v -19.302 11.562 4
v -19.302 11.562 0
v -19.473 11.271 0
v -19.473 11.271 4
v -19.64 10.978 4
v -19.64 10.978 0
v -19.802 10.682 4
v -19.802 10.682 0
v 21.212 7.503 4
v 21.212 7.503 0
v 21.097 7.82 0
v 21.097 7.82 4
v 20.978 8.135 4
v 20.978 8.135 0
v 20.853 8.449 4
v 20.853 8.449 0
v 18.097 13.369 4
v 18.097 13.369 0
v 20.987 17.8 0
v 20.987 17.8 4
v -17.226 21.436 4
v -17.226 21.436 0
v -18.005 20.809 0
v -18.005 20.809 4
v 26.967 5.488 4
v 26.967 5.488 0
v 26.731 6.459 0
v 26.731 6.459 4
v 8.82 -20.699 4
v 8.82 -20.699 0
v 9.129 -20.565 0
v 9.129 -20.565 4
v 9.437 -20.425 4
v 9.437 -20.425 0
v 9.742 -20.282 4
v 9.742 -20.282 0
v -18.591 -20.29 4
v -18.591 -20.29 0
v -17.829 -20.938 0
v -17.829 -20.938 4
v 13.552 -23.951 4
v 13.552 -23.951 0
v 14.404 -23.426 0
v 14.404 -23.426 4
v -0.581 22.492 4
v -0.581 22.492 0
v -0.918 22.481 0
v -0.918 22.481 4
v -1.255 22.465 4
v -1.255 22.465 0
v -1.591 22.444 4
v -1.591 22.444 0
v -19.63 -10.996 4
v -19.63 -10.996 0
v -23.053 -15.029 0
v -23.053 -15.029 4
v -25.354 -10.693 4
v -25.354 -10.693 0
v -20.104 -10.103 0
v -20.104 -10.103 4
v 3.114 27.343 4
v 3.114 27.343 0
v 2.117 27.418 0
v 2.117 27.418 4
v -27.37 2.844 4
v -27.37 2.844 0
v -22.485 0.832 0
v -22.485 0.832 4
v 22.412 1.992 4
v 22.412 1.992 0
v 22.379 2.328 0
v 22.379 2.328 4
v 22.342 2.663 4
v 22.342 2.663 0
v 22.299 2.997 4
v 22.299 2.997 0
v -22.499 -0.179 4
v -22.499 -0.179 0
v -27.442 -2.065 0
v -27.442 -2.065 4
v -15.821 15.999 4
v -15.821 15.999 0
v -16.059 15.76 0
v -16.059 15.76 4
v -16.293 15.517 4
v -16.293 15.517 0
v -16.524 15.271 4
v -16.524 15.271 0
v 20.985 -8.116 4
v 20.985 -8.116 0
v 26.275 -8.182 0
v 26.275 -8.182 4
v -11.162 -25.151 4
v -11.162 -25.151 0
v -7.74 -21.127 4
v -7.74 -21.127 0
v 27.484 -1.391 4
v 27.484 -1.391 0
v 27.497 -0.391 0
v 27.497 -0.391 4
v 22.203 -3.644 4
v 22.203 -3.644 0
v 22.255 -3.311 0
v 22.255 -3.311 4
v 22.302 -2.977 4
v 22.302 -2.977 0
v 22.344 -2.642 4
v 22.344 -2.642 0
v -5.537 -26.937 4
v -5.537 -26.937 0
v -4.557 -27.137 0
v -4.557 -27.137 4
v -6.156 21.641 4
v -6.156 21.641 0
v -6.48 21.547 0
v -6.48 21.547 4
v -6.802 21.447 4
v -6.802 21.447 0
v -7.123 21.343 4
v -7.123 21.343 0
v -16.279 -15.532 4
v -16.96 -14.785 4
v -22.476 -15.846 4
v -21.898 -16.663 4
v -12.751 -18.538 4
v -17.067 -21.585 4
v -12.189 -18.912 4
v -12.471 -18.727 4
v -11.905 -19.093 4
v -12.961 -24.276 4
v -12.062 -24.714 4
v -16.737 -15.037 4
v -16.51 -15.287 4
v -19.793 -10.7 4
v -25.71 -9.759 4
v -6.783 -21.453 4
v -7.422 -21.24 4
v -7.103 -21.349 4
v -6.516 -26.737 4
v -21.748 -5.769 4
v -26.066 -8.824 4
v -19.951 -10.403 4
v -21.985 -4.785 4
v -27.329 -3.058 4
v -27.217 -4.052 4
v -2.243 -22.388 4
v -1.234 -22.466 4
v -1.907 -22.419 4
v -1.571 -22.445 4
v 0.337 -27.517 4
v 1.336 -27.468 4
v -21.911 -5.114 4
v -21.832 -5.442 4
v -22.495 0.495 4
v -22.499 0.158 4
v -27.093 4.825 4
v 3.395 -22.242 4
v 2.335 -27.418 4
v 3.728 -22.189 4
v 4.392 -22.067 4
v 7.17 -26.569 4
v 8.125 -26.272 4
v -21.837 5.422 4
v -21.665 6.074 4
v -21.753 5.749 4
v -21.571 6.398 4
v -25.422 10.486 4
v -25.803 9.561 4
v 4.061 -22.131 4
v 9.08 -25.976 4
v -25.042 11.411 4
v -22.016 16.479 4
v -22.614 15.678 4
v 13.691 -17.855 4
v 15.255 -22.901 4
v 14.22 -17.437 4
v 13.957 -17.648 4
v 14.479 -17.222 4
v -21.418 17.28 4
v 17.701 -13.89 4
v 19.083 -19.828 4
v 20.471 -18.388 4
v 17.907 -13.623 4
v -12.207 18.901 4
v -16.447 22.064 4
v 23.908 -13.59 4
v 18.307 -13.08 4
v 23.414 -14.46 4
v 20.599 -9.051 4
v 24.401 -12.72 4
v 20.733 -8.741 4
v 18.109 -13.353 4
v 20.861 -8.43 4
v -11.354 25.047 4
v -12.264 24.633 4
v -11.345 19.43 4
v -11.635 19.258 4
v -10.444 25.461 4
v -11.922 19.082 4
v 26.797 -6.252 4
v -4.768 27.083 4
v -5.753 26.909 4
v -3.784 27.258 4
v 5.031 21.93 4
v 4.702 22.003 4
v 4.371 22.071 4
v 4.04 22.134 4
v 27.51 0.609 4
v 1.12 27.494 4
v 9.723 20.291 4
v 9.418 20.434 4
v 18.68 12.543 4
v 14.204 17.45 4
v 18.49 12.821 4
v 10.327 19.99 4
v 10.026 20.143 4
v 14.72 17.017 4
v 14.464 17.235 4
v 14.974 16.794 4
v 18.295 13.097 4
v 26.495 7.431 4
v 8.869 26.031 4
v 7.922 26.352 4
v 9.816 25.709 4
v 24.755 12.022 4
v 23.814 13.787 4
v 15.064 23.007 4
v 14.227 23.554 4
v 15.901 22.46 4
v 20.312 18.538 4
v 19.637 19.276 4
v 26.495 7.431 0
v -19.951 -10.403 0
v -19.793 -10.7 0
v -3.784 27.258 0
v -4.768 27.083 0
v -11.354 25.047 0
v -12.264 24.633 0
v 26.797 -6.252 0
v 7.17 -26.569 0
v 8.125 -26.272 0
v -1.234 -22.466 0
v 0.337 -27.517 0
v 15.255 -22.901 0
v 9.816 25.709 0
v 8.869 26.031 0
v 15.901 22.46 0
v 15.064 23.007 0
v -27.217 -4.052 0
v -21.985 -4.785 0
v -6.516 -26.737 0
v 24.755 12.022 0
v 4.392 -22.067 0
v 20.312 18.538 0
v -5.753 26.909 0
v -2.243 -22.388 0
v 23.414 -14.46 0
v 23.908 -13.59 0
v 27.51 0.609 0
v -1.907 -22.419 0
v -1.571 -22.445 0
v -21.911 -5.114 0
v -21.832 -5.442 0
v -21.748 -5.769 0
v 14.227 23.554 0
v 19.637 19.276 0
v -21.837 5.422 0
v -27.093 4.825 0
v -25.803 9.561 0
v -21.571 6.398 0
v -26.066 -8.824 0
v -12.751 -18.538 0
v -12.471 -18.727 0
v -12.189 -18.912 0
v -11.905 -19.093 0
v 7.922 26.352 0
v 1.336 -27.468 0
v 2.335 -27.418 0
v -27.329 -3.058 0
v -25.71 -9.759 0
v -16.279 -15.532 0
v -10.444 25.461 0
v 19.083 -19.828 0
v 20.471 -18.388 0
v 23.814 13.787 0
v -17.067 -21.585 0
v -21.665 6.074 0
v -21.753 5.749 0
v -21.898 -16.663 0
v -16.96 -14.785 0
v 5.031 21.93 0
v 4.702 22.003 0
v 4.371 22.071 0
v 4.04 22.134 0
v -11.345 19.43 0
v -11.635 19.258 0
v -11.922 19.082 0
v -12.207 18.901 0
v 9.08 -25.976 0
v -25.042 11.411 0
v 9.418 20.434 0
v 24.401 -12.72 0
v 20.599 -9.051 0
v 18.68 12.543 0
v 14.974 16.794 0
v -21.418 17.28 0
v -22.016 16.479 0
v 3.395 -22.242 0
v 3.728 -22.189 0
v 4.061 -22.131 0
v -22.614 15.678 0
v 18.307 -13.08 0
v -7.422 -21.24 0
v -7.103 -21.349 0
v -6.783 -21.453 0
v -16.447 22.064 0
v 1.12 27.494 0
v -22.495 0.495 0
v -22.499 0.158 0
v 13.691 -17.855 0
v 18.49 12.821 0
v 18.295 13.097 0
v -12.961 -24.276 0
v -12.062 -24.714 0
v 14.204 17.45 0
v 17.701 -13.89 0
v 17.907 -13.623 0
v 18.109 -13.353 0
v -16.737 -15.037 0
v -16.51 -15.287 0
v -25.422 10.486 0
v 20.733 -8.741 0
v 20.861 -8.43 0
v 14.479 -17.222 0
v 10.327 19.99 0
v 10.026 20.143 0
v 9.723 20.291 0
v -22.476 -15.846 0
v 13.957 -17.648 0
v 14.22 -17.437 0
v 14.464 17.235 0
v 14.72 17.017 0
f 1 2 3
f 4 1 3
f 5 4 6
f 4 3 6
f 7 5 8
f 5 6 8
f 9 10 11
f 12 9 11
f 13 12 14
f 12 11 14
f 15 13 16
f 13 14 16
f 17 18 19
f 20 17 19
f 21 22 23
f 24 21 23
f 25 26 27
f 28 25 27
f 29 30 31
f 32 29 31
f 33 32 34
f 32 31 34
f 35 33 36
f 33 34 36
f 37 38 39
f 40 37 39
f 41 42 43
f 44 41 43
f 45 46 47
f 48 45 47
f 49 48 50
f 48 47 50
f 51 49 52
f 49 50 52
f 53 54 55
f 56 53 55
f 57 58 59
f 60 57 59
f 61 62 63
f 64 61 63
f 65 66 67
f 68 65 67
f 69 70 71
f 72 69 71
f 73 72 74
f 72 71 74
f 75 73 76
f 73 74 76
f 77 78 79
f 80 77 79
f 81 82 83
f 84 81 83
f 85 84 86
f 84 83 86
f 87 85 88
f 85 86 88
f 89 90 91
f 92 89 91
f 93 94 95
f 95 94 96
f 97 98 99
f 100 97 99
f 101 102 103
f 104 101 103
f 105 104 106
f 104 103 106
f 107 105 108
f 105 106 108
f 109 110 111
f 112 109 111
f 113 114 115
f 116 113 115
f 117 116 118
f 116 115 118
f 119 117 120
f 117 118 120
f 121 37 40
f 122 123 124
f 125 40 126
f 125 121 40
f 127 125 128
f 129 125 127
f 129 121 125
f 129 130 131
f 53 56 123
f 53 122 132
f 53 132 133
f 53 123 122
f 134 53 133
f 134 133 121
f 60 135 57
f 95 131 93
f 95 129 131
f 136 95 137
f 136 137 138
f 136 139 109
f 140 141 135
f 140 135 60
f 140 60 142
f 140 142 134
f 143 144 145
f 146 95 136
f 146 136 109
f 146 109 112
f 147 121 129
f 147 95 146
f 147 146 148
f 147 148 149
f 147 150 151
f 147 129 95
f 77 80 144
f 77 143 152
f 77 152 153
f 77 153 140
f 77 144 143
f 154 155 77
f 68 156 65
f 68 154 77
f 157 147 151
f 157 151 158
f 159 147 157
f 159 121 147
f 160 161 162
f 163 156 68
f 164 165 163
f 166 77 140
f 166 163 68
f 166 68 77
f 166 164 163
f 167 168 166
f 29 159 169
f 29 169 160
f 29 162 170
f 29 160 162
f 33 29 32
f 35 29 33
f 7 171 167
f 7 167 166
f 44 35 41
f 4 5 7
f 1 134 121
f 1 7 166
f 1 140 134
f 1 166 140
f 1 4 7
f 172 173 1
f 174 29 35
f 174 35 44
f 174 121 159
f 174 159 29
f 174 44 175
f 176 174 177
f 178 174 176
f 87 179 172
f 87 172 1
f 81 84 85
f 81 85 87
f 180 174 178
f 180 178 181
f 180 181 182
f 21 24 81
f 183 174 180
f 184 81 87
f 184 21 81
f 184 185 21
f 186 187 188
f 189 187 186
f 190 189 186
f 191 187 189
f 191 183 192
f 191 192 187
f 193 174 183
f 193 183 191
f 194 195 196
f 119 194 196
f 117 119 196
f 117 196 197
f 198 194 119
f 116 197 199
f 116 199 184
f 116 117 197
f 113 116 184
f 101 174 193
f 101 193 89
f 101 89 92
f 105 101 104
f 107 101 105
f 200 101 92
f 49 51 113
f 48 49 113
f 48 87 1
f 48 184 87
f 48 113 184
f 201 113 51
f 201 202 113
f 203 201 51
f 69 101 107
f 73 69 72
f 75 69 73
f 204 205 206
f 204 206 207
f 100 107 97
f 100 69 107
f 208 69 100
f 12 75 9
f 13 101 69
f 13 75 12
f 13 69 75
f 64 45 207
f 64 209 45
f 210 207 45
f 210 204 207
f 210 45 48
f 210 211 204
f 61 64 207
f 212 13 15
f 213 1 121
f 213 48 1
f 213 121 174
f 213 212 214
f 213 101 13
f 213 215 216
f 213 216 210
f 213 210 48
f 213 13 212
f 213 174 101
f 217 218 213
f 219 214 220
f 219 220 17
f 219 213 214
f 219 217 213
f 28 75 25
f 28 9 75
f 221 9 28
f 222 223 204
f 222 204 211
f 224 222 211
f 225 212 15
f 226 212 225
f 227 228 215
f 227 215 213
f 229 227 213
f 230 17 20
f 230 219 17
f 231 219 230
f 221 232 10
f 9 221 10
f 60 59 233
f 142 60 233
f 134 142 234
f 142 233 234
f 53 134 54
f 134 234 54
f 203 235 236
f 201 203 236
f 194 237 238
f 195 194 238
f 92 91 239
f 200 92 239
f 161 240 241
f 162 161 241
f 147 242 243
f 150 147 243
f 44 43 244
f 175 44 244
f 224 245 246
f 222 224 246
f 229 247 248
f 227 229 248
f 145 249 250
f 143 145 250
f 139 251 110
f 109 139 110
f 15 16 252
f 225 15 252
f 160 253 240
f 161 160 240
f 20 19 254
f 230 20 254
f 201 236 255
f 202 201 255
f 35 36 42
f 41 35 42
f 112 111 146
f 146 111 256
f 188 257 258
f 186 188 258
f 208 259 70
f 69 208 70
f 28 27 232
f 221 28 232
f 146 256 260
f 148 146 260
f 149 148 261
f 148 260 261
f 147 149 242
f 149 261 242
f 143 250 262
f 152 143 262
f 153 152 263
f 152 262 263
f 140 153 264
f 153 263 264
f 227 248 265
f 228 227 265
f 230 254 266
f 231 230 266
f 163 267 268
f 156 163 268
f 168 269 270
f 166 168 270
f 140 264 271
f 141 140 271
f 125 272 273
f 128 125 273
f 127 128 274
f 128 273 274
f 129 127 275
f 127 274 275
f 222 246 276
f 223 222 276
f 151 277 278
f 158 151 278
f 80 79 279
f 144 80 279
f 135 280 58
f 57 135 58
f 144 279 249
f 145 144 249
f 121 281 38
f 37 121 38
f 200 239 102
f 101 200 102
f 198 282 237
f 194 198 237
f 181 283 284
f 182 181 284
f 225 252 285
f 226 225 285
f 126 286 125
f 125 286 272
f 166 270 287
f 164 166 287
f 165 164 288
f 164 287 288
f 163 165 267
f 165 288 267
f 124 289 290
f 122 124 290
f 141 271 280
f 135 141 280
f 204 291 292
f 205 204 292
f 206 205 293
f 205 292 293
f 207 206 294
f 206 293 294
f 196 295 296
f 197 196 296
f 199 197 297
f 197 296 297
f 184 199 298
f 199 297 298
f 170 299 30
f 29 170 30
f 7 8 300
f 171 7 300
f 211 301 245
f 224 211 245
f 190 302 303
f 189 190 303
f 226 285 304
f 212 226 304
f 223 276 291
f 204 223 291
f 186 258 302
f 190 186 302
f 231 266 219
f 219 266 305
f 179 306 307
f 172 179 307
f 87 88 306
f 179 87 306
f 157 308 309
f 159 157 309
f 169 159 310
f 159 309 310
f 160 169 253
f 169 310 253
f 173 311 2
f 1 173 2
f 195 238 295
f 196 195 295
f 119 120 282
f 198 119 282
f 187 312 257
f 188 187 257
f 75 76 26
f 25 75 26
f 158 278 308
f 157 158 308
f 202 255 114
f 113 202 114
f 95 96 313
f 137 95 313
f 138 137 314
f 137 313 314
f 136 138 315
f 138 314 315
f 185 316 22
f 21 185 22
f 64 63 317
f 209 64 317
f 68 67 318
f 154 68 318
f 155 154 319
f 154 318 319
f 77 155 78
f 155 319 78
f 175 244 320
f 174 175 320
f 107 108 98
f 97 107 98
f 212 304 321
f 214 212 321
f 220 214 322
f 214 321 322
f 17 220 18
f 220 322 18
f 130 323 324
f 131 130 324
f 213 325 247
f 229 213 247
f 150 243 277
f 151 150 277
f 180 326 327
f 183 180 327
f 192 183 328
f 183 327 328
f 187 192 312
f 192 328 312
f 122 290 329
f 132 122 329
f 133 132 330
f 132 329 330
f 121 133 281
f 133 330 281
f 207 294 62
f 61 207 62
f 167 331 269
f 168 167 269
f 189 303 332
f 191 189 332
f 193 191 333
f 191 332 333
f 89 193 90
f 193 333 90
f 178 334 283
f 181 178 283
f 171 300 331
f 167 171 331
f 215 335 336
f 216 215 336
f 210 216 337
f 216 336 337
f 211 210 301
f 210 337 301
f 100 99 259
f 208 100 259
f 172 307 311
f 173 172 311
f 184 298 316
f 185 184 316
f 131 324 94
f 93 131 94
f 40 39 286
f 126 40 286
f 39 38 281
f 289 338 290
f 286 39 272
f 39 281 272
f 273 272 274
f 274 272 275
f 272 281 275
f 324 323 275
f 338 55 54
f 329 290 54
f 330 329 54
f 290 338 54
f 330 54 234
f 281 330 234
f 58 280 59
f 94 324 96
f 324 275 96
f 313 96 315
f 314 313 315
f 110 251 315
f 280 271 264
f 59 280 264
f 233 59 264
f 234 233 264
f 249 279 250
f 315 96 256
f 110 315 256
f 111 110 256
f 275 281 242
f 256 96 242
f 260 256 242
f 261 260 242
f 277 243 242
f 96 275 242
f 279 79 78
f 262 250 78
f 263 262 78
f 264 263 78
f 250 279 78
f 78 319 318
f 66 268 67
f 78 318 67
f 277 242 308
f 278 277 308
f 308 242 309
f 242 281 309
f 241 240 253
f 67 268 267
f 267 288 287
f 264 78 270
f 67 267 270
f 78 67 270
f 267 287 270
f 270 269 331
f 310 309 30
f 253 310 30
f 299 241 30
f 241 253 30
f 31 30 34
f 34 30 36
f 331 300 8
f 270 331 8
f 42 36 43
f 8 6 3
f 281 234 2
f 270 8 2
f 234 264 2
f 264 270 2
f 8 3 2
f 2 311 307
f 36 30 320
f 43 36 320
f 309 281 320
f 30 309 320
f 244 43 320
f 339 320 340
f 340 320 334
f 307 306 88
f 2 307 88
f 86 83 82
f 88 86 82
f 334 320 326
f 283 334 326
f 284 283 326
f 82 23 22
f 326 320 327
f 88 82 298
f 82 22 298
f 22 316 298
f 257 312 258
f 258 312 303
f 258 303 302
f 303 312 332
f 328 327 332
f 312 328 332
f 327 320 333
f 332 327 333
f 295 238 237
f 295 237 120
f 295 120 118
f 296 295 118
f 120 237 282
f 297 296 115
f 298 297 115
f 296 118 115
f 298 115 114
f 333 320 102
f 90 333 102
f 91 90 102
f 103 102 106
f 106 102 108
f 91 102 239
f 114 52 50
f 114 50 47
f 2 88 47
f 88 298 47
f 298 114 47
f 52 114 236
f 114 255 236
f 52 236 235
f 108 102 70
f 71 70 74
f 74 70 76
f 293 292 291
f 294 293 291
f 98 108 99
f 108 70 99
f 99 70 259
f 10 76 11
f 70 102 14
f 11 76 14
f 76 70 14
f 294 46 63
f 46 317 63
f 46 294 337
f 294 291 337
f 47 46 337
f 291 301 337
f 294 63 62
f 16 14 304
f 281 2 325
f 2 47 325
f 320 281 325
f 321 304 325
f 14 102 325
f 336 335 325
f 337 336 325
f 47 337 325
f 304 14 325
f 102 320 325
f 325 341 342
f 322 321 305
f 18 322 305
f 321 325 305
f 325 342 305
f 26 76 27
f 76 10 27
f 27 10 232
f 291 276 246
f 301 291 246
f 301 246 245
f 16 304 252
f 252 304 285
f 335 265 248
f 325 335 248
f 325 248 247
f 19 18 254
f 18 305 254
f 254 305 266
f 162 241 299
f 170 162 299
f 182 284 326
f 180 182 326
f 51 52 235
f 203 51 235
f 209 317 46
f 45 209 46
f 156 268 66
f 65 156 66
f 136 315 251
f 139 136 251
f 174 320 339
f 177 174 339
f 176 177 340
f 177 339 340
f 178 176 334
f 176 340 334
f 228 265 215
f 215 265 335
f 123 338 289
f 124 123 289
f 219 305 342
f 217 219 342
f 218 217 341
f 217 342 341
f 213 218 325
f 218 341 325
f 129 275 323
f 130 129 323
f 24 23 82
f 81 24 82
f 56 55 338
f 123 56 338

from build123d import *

# Parameters (mm, degrees)
F1_DEPTH = 4


# Not quite as in the source:
# - a feature names something its author has since deleted; it is built from what else it names


with BuildPart() as f1:
    # F0 (on Top) → F1 (new body)
    with BuildSketch(Plane.XY):
        with BuildLine():
            ThreePointArc((-15.8207142224, 15.9985937349), (-16.1763177404, 15.6389495927), (-16.5237476958, 15.2714034091))
            ThreePointArc((-16.5237476958, 15.2714034091), (-17.2896362976, 14.3985581465), (-18.0094723367, 13.4873609781))
            ThreePointArc((-18.0094723367, 13.4873609781), (-18.6807530995, 12.5411109411), (-19.3023658635, 11.5615168585))
            ThreePointArc((-19.3023658635, 11.5615168585), (-19.557357582, 11.1247365996), (-19.8024673676, 10.6823352389))
            ThreePointArc((-19.8024673676, 10.6823352389), (-20.7974411865, 8.585827863), (-21.5711788684, 6.3979873576))
            ThreePointArc((-21.5711788684, 6.3979873576), (-21.7095367198, 5.9115154921), (-21.8369251863, 5.4220566587))
            ThreePointArc((-21.8369251863, 5.4220566587), (-22.2792598903, 3.1439749905), (-22.4845953717, 0.8324487809))
            ThreePointArc((-22.4845953717, 0.8324487809), (-22.4976258234, 0.3268521252), (-22.4992886849, -0.1789096823))
            ThreePointArc((-22.4992886849, -0.1789096823), (-22.3611907578, -2.4954253934), (-21.9852220552, -4.7853956142))
            ThreePointArc((-21.9852220552, -4.7853956142), (-21.872106356, -5.2783485629), (-21.7479391288, -5.76863447))
            ThreePointArc((-21.7479391288, -5.76863447), (-21.0380857712, -7.9780290224), (-20.104436381, -10.1025560035))
            ThreePointArc((-20.104436381, -10.1025560035), (-19.8722820063, -10.5518911983), (-19.630086574, -10.9958947383))
            ThreePointArc((-19.630086574, -10.9958947383), (-18.393080483, -12.9593437467), (-16.96041503, -14.7849356444))
            ThreePointArc((-16.96041503, -14.7849356444), (-16.623809093, -15.1624197026), (-16.2788034853, -15.5322425002))
            ThreePointArc((-16.2788034853, -15.5322425002), (-14.5923703031, -17.1263752422), (-12.7507084267, -18.5383234036))
            ThreePointArc((-12.7507084267, -18.5383234036), (-12.3308011164, -18.8202376135), (-11.9046633044, -19.0926423422))
            ThreePointArc((-11.9046633044, -19.0926423422), (-9.87476783, -20.2172935949), (-7.7398279191, -21.1268801242))
            ThreePointArc((-7.7398279191, -21.1268801242), (-7.263003556, -21.2955107792), (-6.7825093458, -21.4533812481))
            ThreePointArc((-6.7825093458, -21.4533812481), (-4.5366973773, -22.0378850371), (-2.2426255582, -22.3879572674))
            ThreePointArc((-2.2426255582, -22.3879572674), (-1.7388447708, -22.4327086832), (-1.2341853806, -22.46612531))
            ThreePointArc((-1.2341853806, -22.46612531), (1.0864304565, -22.4737551126), (3.3954892143, -22.2423167183))
            ThreePointArc((3.3954892143, -22.2423167183), (3.8945720264, -22.1603769988), (4.391686991, -22.0672400942))
            ThreePointArc((4.391686991, -22.0672400942), (6.641293869, -21.4975165018), (8.8202529117, -20.6991096082))
            ThreePointArc((8.8202529117, -20.6991096082), (9.28327854, -20.4956273275), (9.7416135175, -20.2817890255))
            ThreePointArc((9.7416135175, -20.2817890255), (11.7788603628, -19.1705098668), (13.69080768, -17.8553013155))
            ThreePointArc((13.69080768, -17.8553013155), (14.0886825213, -17.5430620136), (14.4794386395, -17.2219585612))
            ThreePointArc((14.4794386395, -17.2219585612), (16.1763177404, -15.6389495927), (17.7011186506, -13.8895787739))
            ThreePointArc((17.7011186506, -13.8895787739), (18.0088427653, -13.4882015945), (18.3074673802, -13.0800091026))
            ThreePointArc((18.3074673802, -13.0800091026), (19.557357582, -11.1247365996), (20.5992032362, -9.0511229157))
            ThreePointArc((20.5992032362, -9.0511229157), (20.7974411865, -8.585827863), (20.9851706152, -8.1161945671))
            ThreePointArc((20.9851706152, -8.1161945671), (21.7095367198, -5.9115154921), (22.2029641238, -3.643951717))
            ThreePointArc((22.2029641238, -3.643951717), (22.2792598903, -3.1439749905), (22.3442984024, -2.6424096777))
            ThreePointArc((22.3442984024, -2.6424096777), (22.4610408714, -1.3234964953), (22.5, 0))
            ThreePointArc((22.5, 0), (22.4778969231, 0.9970706661), (22.4116311188, 1.9921823697))
            ThreePointArc((22.4116311188, 1.9921823697), (22.3611907578, 2.4954253934), (22.2994517444, 2.9974075298))
            ThreePointArc((22.2994517444, 2.9974075298), (21.872106356, 5.2783485629), (21.2120929064, 7.5031403113))
            ThreePointArc((21.2120929064, 7.5031403113), (21.0380857712, 7.9780290224), (20.8534485216, 8.4488865986))
            ThreePointArc((20.8534485216, 8.4488865986), (19.8722820063, 10.5518911983), (18.679720884, 12.5426483525))
            ThreePointArc((18.679720884, 12.5426483525), (18.393080483, 12.9593437467), (18.0971464347, 13.3694910495))
            ThreePointArc((18.0971464347, 13.3694910495), (16.623809093, 15.1624197026), (14.9736332993, 16.7940556691))
            ThreePointArc((14.9736332993, 16.7940556691), (14.5923703031, 17.1263752422), (14.2037340805, 17.4500412082))
            ThreePointArc((14.2037340805, 17.4500412082), (12.3308011164, 18.8202376135), (10.3266972653, 19.9902307038))
            ThreePointArc((10.3266972653, 19.9902307038), (9.87476783, 20.2172935949), (9.4178488765, 20.4341411011))
            ThreePointArc((9.4178488765, 20.4341411011), (7.263003556, 21.2955107792), (5.0308968631, 21.9303460245))
            ThreePointArc((5.0308968631, 21.9303460245), (4.5366973773, 22.0378850371), (4.0402055911, 22.1342887571))
            ThreePointArc((4.0402055911, 22.1342887571), (1.7388447708, 22.4327086832), (-0.5810132914, 22.4924970502))
            ThreePointArc((-0.5810132914, 22.4924970502), (-1.0864304565, 22.4737551126), (-1.5912986705, 22.4436576462))
            ThreePointArc((-1.5912986705, 22.4436576462), (-3.8945720264, 22.1603769988), (-6.1564162439, 21.6413617647))
            ThreePointArc((-6.1564162439, 21.6413617647), (-6.641293869, 21.4975165018), (-7.1228157842, 21.3428089835))
            ThreePointArc((-7.1228157842, 21.3428089835), (-9.28327854, 20.4956273275), (-11.3449889221, 19.4304201282))
            ThreePointArc((-11.3449889221, 19.4304201282), (-11.7788603628, 19.1705098668), (-12.2067801862, 18.9009131389))
            ThreePointArc((-12.2067801862, 18.9009131389), (-14.0886825213, 17.5430620136), (-15.8207142224, 15.9985937349))
        make_face()
        with BuildLine():
            ThreePointArc((-18.0094723367, 13.4873609781), (-17.2896362976, 14.3985581465), (-16.5237476958, 15.2714034091))
            Line((-16.5237476958, 15.2714034091), (-21.4175280286, 17.2801378501))
            Line((-21.4175280286, 17.2801378501), (-22.0158291312, 16.4788664912))
            Line((-22.0158291312, 16.4788664912), (-18.0094723367, 13.4873609781))
        make_face()
        with BuildLine():
            ThreePointArc((-19.3023658635, 11.5615168585), (-18.6807530995, 12.5411109411), (-18.0094723367, 13.4873609781))
            Line((-18.0094723367, 13.4873609781), (-22.0158291312, 16.4788664912))
            Line((-22.0158291312, 16.4788664912), (-22.6141302339, 15.6775951323))
            Line((-22.6141302339, 15.6775951323), (-19.3023658635, 11.5615168585))
        make_face()
        with BuildLine():
            Line((-18.0048063836, 20.8089601483), (-15.8207142224, 15.9985937349))
            ThreePointArc((-15.8207142224, 15.9985937349), (-14.0886825213, 17.5430620136), (-12.2067801862, 18.9009131389))
            Line((-12.2067801862, 18.9009131389), (-16.4472614694, 22.0635731724))
            Line((-16.4472614694, 22.0635731724), (-17.2260339265, 21.4362666603))
            Line((-17.2260339265, 21.4362666603), (-18.0048063836, 20.8089601483))
        make_face()
        with BuildLine():
            ThreePointArc((-21.5711788684, 6.3979873576), (-20.7974411865, 8.585827863), (-19.8024673676, 10.6823352389))
            Line((-19.8024673676, 10.6823352389), (-25.0420525337, 11.4109279148))
            Line((-25.0420525337, 11.4109279148), (-25.4222888231, 10.4860385354))
            Line((-25.4222888231, 10.4860385354), (-25.8025251126, 9.5611491559))
            Line((-25.8025251126, 9.5611491559), (-21.5711788684, 6.3979873576))
        make_face()
        with BuildLine():
            Line((-12.2641743313, 24.6328216682), (-11.3449889221, 19.4304201282))
            ThreePointArc((-11.3449889221, 19.4304201282), (-9.28327854, 20.4956273275), (-7.1228157842, 21.3428089835))
            Line((-7.1228157842, 21.3428089835), (-10.4435529833, 25.4606730481))
            Line((-10.4435529833, 25.4606730481), (-11.3538636573, 25.0467473581))
            Line((-11.3538636573, 25.0467473581), (-12.2641743313, 24.6328216682))
        make_face()
        with BuildLine():
            ThreePointArc((-22.4845953717, 0.8324487809), (-22.2792598903, 3.1439749905), (-21.8369251863, 5.4220566587))
            Line((-21.8369251863, 5.4220566587), (-27.0930927798, 4.8247274121))
            Line((-27.0930927798, 4.8247274121), (-27.2313726116, 3.8343342134))
            Line((-27.2313726116, 3.8343342134), (-27.3696524434, 2.8439410147))
            Line((-27.3696524434, 2.8439410147), (-22.4845953717, 0.8324487809))
        make_face()
        with BuildLine():
            Line((-5.7529391012, 26.9089124095), (-6.1564162439, 21.6413617647))
            ThreePointArc((-6.1564162439, 21.6413617647), (-3.8945720264, 22.1603769988), (-1.5912986705, 22.4436576462))
            Line((-1.5912986705, 22.4436576462), (-3.7836376545, 27.2579851984))
            Line((-3.7836376545, 27.2579851984), (-4.7682883778, 27.083448804))
            Line((-4.7682883778, 27.083448804), (-5.7529391012, 26.9089124095))
        make_face()
        with BuildLine():
            ThreePointArc((-21.9852220552, -4.7853956142), (-22.3611907578, -2.4954253934), (-22.4992886849, -0.1789096823))
            Line((-22.4992886849, -0.1789096823), (-27.4417743651, -2.0646284579))
            Line((-27.4417743651, -2.0646284579), (-27.3294091089, -3.0582954289))
            Line((-27.3294091089, -3.0582954289), (-27.2170438526, -4.0519623998))
            Line((-27.2170438526, -4.0519623998), (-21.9852220552, -4.7853956142))
        make_face()
        with BuildLine():
            Line((1.1197744504, 27.4942172201), (-0.5810132914, 22.4924970502))
            ThreePointArc((-0.5810132914, 22.4924970502), (1.7388447708, 22.4327086832), (4.0402055911, 22.1342887571))
            Line((4.0402055911, 22.1342887571), (3.1140175434, 27.3425778908))
            Line((3.1140175434, 27.3425778908), (2.1168959969, 27.4183975554))
            Line((2.1168959969, 27.4183975554), (1.1197744504, 27.4942172201))
        make_face()
        with BuildLine():
            ThreePointArc((-20.104436381, -10.1025560035), (-21.0380857712, -7.9780290224), (-21.7479391288, -5.76863447))
            Line((-21.7479391288, -5.76863447), (-26.0661883433, -8.8242561288))
            Line((-26.0661883433, -8.8242561288), (-25.7102383213, -9.7587611217))
            Line((-25.7102383213, -9.7587611217), (-25.3542882993, -10.6932661147))
            Line((-25.3542882993, -10.6932661147), (-20.104436381, -10.1025560035))
        make_face()
        with BuildLine():
            Line((7.9221284551, 26.3519592461), (5.0308968631, 21.9303460245))
            ThreePointArc((5.0308968631, 21.9303460245), (7.263003556, 21.2955107792), (9.4178488765, 20.4341411011))
            Line((9.4178488765, 20.4341411011), (9.8160075665, 25.7091358554))
            Line((9.8160075665, 25.7091358554), (8.8690680108, 26.0305475507))
            Line((8.8690680108, 26.0305475507), (7.9221284551, 26.3519592461))
        make_face()
        with BuildLine():
            ThreePointArc((-16.96041503, -14.7849356444), (-18.393080483, -12.9593437467), (-19.630086574, -10.9958947383))
            Line((-19.630086574, -10.9958947383), (-23.0527678432, -15.0294233337))
            Line((-23.0527678432, -15.0294233337), (-22.4755987044, -15.8460479631))
            Line((-22.4755987044, -15.8460479631), (-21.8984295657, -16.6626725925))
            Line((-21.8984295657, -16.6626725925), (-16.96041503, -14.7849356444))
        make_face()
        with BuildLine():
            Line((14.2267059934, 23.5539107569), (10.3266972653, 19.9902307038))
            ThreePointArc((10.3266972653, 19.9902307038), (12.3308011164, 18.8202376135), (14.2037340805, 17.4500412082))
            Line((14.2037340805, 17.4500412082), (15.9012217334, 22.4602942626))
            Line((15.9012217334, 22.4602942626), (15.0639638634, 23.0071025097))
            Line((15.0639638634, 23.0071025097), (14.2267059934, 23.5539107569))
        make_face()
        with BuildLine():
            ThreePointArc((-12.7507084267, -18.5383234036), (-14.5923703031, -17.1263752422), (-16.2788034853, -15.5322425002))
            Line((-16.2788034853, -15.5322425002), (-18.5908571573, -20.2902365963))
            Line((-18.5908571573, -20.2902365963), (-17.8287345614, -20.9376693333))
            Line((-17.8287345614, -20.9376693333), (-17.0666119656, -21.5851020702))
            Line((-17.0666119656, -21.5851020702), (-12.7507084267, -18.5383234036))
        make_face()
        with BuildLine():
            Line((19.637367272, 19.2758834296), (14.9736332993, 16.7940556691))
            ThreePointArc((14.9736332993, 16.7940556691), (16.623809093, 15.1624197026), (18.0971464347, 13.3694910495))
            Line((18.0971464347, 13.3694910495), (20.9873036582, 17.8001897781))
            Line((20.9873036582, 17.8001897781), (20.3123354651, 18.5380366038))
            Line((20.3123354651, 18.5380366038), (19.637367272, 19.2758834296))
        make_face()
        with BuildLine():
            ThreePointArc((-7.7398279191, -21.1268801242), (-9.87476783, -20.2172935949), (-11.9046633044, -19.0926423422))
            Line((-11.9046633044, -19.0926423422), (-12.9608145438, -24.2761396712))
            Line((-12.9608145438, -24.2761396712), (-12.0616254564, -24.7136999358))
            Line((-12.0616254564, -24.7136999358), (-11.1624363691, -25.1512602005))
            Line((-11.1624363691, -25.1512602005), (-7.7398279191, -21.1268801242))
        make_face()
        with BuildLine():
            Line((23.8141405436, 13.7866814547), (18.679720884, 12.5426483525))
            ThreePointArc((18.679720884, 12.5426483525), (19.8722820063, 10.5518911983), (20.8534485216, 8.4488865986))
            Line((20.8534485216, 8.4488865986), (24.7546761082, 12.0216339053))
            Line((24.7546761082, 12.0216339053), (24.2844083259, 12.90415768))
            Line((24.2844083259, 12.90415768), (23.8141405436, 13.7866814547))
        make_face()
        with BuildLine():
            ThreePointArc((-2.2426255582, -22.3879572674), (-4.5366973773, -22.0378850371), (-6.7825093458, -21.4533812481))
            Line((-6.7825093458, -21.4533812481), (-6.516396286, -26.7366836092))
            Line((-6.516396286, -26.7366836092), (-5.5366400645, -26.9368778808))
            Line((-5.5366400645, -26.9368778808), (-4.556883843, -27.1370721525))
            Line((-4.556883843, -27.1370721525), (-2.2426255582, -22.3879572674))
        make_face()
        with BuildLine():
            Line((26.4945837827, 7.4312115802), (21.2120929064, 7.5031403113))
            ThreePointArc((21.2120929064, 7.5031403113), (21.872106356, 5.2783485629), (22.2994517444, 2.9974075298))
            Line((22.2994517444, 2.9974075298), (26.966621217, 5.4877145618))
            Line((26.966621217, 5.4877145618), (26.7306024999, 6.459463071))
            Line((26.7306024999, 6.459463071), (26.4945837827, 7.4312115802))
        make_face()
        with BuildLine():
            ThreePointArc((3.3954892143, -22.2423167183), (1.0864304565, -22.4737551126), (-1.2341853806, -22.46612531))
            Line((-1.2341853806, -22.46612531), (0.3374711161, -27.5172633854))
            Line((0.3374711161, -27.5172633854), (1.3362327851, -27.4675127217))
            Line((1.3362327851, -27.4675127217), (2.3349944541, -27.4177620579))
            Line((2.3349944541, -27.4177620579), (3.3954892143, -22.2423167183))
        make_face()
        with BuildLine():
            Line((27.5102748824, 0.608811352), (22.4116311188, 1.9921823697))
            ThreePointArc((22.4116311188, 1.9921823697), (22.4778969231, 0.9970706661), (22.5, 0))
            ThreePointArc((22.5, 0), (22.4610408714, -1.3234964953), (22.3442984024, -2.6424096777))
            Line((22.3442984024, -2.6424096777), (27.4841543385, -1.3910180701))
            Line((27.4841543385, -1.3910180701), (27.4972146104, -0.3911033591))
            Line((27.4972146104, -0.3911033591), (27.5102748824, 0.608811352))
        make_face()
        with BuildLine():
            ThreePointArc((8.8202529117, -20.6991096082), (6.641293869, -21.4975165018), (4.391686991, -22.0672400942))
            Line((4.391686991, -22.0672400942), (7.1701339668, -26.5688323017))
            Line((7.1701339668, -26.5688323017), (8.1251452144, -26.2722627197))
            Line((8.1251452144, -26.2722627197), (9.080156462, -25.9756931378))
            Line((9.080156462, -25.9756931378), (8.8202529117, -20.6991096082))
        make_face()
        with BuildLine():
            Line((26.7973942355, -6.2518427326), (22.2029641238, -3.643951717))
            ThreePointArc((22.2029641238, -3.643951717), (21.7095367198, -5.9115154921), (20.9851706152, -8.1161945671))
            Line((20.9851706152, -8.1161945671), (26.2747569633, -8.1823479208))
            Line((26.2747569633, -8.1823479208), (26.5360755994, -7.2170953267))
            Line((26.5360755994, -7.2170953267), (26.7973942355, -6.2518427326))
        make_face()
        with BuildLine():
            ThreePointArc((13.69080768, -17.8553013155), (11.7788603628, -19.1705098668), (9.7416135175, -20.2817890255))
            Line((9.7416135175, -20.2817890255), (13.5522709305, -23.9509837711))
            Line((13.5522709305, -23.9509837711), (14.4035248878, -23.4262298285))
            Line((14.4035248878, -23.4262298285), (15.254778845, -22.901475886))
            Line((15.254778845, -22.901475886), (13.69080768, -17.8553013155))
        make_face()
        with BuildLine():
            Line((24.4007347549, -12.7196705455), (20.5992032362, -9.0511229157))
            ThreePointArc((20.5992032362, -9.0511229157), (19.557357582, -11.1247365996), (18.3074673802, -13.0800091026))
            Line((18.3074673802, -13.0800091026), (23.4144199762, -14.459550759))
            Line((23.4144199762, -14.459550759), (23.9075773656, -13.5896106523))
            Line((23.9075773656, -13.5896106523), (24.4007347549, -12.7196705455))
        make_face()
        with BuildLine():
            ThreePointArc((17.7011186506, -13.8895787739), (16.1763177404, -15.6389495927), (14.4794386395, -17.2219585612))
            Line((14.4794386395, -17.2219585612), (19.0828688698, -19.8282068446))
            Line((19.0828688698, -19.8282068446), (19.7768781199, -19.1082407615))
            Line((19.7768781199, -19.1082407615), (20.47088737, -18.3882746784))
            Line((20.47088737, -18.3882746784), (17.7011186506, -13.8895787739))
        make_face()
    extrude(amount=F1_DEPTH)


solid = f1.part
